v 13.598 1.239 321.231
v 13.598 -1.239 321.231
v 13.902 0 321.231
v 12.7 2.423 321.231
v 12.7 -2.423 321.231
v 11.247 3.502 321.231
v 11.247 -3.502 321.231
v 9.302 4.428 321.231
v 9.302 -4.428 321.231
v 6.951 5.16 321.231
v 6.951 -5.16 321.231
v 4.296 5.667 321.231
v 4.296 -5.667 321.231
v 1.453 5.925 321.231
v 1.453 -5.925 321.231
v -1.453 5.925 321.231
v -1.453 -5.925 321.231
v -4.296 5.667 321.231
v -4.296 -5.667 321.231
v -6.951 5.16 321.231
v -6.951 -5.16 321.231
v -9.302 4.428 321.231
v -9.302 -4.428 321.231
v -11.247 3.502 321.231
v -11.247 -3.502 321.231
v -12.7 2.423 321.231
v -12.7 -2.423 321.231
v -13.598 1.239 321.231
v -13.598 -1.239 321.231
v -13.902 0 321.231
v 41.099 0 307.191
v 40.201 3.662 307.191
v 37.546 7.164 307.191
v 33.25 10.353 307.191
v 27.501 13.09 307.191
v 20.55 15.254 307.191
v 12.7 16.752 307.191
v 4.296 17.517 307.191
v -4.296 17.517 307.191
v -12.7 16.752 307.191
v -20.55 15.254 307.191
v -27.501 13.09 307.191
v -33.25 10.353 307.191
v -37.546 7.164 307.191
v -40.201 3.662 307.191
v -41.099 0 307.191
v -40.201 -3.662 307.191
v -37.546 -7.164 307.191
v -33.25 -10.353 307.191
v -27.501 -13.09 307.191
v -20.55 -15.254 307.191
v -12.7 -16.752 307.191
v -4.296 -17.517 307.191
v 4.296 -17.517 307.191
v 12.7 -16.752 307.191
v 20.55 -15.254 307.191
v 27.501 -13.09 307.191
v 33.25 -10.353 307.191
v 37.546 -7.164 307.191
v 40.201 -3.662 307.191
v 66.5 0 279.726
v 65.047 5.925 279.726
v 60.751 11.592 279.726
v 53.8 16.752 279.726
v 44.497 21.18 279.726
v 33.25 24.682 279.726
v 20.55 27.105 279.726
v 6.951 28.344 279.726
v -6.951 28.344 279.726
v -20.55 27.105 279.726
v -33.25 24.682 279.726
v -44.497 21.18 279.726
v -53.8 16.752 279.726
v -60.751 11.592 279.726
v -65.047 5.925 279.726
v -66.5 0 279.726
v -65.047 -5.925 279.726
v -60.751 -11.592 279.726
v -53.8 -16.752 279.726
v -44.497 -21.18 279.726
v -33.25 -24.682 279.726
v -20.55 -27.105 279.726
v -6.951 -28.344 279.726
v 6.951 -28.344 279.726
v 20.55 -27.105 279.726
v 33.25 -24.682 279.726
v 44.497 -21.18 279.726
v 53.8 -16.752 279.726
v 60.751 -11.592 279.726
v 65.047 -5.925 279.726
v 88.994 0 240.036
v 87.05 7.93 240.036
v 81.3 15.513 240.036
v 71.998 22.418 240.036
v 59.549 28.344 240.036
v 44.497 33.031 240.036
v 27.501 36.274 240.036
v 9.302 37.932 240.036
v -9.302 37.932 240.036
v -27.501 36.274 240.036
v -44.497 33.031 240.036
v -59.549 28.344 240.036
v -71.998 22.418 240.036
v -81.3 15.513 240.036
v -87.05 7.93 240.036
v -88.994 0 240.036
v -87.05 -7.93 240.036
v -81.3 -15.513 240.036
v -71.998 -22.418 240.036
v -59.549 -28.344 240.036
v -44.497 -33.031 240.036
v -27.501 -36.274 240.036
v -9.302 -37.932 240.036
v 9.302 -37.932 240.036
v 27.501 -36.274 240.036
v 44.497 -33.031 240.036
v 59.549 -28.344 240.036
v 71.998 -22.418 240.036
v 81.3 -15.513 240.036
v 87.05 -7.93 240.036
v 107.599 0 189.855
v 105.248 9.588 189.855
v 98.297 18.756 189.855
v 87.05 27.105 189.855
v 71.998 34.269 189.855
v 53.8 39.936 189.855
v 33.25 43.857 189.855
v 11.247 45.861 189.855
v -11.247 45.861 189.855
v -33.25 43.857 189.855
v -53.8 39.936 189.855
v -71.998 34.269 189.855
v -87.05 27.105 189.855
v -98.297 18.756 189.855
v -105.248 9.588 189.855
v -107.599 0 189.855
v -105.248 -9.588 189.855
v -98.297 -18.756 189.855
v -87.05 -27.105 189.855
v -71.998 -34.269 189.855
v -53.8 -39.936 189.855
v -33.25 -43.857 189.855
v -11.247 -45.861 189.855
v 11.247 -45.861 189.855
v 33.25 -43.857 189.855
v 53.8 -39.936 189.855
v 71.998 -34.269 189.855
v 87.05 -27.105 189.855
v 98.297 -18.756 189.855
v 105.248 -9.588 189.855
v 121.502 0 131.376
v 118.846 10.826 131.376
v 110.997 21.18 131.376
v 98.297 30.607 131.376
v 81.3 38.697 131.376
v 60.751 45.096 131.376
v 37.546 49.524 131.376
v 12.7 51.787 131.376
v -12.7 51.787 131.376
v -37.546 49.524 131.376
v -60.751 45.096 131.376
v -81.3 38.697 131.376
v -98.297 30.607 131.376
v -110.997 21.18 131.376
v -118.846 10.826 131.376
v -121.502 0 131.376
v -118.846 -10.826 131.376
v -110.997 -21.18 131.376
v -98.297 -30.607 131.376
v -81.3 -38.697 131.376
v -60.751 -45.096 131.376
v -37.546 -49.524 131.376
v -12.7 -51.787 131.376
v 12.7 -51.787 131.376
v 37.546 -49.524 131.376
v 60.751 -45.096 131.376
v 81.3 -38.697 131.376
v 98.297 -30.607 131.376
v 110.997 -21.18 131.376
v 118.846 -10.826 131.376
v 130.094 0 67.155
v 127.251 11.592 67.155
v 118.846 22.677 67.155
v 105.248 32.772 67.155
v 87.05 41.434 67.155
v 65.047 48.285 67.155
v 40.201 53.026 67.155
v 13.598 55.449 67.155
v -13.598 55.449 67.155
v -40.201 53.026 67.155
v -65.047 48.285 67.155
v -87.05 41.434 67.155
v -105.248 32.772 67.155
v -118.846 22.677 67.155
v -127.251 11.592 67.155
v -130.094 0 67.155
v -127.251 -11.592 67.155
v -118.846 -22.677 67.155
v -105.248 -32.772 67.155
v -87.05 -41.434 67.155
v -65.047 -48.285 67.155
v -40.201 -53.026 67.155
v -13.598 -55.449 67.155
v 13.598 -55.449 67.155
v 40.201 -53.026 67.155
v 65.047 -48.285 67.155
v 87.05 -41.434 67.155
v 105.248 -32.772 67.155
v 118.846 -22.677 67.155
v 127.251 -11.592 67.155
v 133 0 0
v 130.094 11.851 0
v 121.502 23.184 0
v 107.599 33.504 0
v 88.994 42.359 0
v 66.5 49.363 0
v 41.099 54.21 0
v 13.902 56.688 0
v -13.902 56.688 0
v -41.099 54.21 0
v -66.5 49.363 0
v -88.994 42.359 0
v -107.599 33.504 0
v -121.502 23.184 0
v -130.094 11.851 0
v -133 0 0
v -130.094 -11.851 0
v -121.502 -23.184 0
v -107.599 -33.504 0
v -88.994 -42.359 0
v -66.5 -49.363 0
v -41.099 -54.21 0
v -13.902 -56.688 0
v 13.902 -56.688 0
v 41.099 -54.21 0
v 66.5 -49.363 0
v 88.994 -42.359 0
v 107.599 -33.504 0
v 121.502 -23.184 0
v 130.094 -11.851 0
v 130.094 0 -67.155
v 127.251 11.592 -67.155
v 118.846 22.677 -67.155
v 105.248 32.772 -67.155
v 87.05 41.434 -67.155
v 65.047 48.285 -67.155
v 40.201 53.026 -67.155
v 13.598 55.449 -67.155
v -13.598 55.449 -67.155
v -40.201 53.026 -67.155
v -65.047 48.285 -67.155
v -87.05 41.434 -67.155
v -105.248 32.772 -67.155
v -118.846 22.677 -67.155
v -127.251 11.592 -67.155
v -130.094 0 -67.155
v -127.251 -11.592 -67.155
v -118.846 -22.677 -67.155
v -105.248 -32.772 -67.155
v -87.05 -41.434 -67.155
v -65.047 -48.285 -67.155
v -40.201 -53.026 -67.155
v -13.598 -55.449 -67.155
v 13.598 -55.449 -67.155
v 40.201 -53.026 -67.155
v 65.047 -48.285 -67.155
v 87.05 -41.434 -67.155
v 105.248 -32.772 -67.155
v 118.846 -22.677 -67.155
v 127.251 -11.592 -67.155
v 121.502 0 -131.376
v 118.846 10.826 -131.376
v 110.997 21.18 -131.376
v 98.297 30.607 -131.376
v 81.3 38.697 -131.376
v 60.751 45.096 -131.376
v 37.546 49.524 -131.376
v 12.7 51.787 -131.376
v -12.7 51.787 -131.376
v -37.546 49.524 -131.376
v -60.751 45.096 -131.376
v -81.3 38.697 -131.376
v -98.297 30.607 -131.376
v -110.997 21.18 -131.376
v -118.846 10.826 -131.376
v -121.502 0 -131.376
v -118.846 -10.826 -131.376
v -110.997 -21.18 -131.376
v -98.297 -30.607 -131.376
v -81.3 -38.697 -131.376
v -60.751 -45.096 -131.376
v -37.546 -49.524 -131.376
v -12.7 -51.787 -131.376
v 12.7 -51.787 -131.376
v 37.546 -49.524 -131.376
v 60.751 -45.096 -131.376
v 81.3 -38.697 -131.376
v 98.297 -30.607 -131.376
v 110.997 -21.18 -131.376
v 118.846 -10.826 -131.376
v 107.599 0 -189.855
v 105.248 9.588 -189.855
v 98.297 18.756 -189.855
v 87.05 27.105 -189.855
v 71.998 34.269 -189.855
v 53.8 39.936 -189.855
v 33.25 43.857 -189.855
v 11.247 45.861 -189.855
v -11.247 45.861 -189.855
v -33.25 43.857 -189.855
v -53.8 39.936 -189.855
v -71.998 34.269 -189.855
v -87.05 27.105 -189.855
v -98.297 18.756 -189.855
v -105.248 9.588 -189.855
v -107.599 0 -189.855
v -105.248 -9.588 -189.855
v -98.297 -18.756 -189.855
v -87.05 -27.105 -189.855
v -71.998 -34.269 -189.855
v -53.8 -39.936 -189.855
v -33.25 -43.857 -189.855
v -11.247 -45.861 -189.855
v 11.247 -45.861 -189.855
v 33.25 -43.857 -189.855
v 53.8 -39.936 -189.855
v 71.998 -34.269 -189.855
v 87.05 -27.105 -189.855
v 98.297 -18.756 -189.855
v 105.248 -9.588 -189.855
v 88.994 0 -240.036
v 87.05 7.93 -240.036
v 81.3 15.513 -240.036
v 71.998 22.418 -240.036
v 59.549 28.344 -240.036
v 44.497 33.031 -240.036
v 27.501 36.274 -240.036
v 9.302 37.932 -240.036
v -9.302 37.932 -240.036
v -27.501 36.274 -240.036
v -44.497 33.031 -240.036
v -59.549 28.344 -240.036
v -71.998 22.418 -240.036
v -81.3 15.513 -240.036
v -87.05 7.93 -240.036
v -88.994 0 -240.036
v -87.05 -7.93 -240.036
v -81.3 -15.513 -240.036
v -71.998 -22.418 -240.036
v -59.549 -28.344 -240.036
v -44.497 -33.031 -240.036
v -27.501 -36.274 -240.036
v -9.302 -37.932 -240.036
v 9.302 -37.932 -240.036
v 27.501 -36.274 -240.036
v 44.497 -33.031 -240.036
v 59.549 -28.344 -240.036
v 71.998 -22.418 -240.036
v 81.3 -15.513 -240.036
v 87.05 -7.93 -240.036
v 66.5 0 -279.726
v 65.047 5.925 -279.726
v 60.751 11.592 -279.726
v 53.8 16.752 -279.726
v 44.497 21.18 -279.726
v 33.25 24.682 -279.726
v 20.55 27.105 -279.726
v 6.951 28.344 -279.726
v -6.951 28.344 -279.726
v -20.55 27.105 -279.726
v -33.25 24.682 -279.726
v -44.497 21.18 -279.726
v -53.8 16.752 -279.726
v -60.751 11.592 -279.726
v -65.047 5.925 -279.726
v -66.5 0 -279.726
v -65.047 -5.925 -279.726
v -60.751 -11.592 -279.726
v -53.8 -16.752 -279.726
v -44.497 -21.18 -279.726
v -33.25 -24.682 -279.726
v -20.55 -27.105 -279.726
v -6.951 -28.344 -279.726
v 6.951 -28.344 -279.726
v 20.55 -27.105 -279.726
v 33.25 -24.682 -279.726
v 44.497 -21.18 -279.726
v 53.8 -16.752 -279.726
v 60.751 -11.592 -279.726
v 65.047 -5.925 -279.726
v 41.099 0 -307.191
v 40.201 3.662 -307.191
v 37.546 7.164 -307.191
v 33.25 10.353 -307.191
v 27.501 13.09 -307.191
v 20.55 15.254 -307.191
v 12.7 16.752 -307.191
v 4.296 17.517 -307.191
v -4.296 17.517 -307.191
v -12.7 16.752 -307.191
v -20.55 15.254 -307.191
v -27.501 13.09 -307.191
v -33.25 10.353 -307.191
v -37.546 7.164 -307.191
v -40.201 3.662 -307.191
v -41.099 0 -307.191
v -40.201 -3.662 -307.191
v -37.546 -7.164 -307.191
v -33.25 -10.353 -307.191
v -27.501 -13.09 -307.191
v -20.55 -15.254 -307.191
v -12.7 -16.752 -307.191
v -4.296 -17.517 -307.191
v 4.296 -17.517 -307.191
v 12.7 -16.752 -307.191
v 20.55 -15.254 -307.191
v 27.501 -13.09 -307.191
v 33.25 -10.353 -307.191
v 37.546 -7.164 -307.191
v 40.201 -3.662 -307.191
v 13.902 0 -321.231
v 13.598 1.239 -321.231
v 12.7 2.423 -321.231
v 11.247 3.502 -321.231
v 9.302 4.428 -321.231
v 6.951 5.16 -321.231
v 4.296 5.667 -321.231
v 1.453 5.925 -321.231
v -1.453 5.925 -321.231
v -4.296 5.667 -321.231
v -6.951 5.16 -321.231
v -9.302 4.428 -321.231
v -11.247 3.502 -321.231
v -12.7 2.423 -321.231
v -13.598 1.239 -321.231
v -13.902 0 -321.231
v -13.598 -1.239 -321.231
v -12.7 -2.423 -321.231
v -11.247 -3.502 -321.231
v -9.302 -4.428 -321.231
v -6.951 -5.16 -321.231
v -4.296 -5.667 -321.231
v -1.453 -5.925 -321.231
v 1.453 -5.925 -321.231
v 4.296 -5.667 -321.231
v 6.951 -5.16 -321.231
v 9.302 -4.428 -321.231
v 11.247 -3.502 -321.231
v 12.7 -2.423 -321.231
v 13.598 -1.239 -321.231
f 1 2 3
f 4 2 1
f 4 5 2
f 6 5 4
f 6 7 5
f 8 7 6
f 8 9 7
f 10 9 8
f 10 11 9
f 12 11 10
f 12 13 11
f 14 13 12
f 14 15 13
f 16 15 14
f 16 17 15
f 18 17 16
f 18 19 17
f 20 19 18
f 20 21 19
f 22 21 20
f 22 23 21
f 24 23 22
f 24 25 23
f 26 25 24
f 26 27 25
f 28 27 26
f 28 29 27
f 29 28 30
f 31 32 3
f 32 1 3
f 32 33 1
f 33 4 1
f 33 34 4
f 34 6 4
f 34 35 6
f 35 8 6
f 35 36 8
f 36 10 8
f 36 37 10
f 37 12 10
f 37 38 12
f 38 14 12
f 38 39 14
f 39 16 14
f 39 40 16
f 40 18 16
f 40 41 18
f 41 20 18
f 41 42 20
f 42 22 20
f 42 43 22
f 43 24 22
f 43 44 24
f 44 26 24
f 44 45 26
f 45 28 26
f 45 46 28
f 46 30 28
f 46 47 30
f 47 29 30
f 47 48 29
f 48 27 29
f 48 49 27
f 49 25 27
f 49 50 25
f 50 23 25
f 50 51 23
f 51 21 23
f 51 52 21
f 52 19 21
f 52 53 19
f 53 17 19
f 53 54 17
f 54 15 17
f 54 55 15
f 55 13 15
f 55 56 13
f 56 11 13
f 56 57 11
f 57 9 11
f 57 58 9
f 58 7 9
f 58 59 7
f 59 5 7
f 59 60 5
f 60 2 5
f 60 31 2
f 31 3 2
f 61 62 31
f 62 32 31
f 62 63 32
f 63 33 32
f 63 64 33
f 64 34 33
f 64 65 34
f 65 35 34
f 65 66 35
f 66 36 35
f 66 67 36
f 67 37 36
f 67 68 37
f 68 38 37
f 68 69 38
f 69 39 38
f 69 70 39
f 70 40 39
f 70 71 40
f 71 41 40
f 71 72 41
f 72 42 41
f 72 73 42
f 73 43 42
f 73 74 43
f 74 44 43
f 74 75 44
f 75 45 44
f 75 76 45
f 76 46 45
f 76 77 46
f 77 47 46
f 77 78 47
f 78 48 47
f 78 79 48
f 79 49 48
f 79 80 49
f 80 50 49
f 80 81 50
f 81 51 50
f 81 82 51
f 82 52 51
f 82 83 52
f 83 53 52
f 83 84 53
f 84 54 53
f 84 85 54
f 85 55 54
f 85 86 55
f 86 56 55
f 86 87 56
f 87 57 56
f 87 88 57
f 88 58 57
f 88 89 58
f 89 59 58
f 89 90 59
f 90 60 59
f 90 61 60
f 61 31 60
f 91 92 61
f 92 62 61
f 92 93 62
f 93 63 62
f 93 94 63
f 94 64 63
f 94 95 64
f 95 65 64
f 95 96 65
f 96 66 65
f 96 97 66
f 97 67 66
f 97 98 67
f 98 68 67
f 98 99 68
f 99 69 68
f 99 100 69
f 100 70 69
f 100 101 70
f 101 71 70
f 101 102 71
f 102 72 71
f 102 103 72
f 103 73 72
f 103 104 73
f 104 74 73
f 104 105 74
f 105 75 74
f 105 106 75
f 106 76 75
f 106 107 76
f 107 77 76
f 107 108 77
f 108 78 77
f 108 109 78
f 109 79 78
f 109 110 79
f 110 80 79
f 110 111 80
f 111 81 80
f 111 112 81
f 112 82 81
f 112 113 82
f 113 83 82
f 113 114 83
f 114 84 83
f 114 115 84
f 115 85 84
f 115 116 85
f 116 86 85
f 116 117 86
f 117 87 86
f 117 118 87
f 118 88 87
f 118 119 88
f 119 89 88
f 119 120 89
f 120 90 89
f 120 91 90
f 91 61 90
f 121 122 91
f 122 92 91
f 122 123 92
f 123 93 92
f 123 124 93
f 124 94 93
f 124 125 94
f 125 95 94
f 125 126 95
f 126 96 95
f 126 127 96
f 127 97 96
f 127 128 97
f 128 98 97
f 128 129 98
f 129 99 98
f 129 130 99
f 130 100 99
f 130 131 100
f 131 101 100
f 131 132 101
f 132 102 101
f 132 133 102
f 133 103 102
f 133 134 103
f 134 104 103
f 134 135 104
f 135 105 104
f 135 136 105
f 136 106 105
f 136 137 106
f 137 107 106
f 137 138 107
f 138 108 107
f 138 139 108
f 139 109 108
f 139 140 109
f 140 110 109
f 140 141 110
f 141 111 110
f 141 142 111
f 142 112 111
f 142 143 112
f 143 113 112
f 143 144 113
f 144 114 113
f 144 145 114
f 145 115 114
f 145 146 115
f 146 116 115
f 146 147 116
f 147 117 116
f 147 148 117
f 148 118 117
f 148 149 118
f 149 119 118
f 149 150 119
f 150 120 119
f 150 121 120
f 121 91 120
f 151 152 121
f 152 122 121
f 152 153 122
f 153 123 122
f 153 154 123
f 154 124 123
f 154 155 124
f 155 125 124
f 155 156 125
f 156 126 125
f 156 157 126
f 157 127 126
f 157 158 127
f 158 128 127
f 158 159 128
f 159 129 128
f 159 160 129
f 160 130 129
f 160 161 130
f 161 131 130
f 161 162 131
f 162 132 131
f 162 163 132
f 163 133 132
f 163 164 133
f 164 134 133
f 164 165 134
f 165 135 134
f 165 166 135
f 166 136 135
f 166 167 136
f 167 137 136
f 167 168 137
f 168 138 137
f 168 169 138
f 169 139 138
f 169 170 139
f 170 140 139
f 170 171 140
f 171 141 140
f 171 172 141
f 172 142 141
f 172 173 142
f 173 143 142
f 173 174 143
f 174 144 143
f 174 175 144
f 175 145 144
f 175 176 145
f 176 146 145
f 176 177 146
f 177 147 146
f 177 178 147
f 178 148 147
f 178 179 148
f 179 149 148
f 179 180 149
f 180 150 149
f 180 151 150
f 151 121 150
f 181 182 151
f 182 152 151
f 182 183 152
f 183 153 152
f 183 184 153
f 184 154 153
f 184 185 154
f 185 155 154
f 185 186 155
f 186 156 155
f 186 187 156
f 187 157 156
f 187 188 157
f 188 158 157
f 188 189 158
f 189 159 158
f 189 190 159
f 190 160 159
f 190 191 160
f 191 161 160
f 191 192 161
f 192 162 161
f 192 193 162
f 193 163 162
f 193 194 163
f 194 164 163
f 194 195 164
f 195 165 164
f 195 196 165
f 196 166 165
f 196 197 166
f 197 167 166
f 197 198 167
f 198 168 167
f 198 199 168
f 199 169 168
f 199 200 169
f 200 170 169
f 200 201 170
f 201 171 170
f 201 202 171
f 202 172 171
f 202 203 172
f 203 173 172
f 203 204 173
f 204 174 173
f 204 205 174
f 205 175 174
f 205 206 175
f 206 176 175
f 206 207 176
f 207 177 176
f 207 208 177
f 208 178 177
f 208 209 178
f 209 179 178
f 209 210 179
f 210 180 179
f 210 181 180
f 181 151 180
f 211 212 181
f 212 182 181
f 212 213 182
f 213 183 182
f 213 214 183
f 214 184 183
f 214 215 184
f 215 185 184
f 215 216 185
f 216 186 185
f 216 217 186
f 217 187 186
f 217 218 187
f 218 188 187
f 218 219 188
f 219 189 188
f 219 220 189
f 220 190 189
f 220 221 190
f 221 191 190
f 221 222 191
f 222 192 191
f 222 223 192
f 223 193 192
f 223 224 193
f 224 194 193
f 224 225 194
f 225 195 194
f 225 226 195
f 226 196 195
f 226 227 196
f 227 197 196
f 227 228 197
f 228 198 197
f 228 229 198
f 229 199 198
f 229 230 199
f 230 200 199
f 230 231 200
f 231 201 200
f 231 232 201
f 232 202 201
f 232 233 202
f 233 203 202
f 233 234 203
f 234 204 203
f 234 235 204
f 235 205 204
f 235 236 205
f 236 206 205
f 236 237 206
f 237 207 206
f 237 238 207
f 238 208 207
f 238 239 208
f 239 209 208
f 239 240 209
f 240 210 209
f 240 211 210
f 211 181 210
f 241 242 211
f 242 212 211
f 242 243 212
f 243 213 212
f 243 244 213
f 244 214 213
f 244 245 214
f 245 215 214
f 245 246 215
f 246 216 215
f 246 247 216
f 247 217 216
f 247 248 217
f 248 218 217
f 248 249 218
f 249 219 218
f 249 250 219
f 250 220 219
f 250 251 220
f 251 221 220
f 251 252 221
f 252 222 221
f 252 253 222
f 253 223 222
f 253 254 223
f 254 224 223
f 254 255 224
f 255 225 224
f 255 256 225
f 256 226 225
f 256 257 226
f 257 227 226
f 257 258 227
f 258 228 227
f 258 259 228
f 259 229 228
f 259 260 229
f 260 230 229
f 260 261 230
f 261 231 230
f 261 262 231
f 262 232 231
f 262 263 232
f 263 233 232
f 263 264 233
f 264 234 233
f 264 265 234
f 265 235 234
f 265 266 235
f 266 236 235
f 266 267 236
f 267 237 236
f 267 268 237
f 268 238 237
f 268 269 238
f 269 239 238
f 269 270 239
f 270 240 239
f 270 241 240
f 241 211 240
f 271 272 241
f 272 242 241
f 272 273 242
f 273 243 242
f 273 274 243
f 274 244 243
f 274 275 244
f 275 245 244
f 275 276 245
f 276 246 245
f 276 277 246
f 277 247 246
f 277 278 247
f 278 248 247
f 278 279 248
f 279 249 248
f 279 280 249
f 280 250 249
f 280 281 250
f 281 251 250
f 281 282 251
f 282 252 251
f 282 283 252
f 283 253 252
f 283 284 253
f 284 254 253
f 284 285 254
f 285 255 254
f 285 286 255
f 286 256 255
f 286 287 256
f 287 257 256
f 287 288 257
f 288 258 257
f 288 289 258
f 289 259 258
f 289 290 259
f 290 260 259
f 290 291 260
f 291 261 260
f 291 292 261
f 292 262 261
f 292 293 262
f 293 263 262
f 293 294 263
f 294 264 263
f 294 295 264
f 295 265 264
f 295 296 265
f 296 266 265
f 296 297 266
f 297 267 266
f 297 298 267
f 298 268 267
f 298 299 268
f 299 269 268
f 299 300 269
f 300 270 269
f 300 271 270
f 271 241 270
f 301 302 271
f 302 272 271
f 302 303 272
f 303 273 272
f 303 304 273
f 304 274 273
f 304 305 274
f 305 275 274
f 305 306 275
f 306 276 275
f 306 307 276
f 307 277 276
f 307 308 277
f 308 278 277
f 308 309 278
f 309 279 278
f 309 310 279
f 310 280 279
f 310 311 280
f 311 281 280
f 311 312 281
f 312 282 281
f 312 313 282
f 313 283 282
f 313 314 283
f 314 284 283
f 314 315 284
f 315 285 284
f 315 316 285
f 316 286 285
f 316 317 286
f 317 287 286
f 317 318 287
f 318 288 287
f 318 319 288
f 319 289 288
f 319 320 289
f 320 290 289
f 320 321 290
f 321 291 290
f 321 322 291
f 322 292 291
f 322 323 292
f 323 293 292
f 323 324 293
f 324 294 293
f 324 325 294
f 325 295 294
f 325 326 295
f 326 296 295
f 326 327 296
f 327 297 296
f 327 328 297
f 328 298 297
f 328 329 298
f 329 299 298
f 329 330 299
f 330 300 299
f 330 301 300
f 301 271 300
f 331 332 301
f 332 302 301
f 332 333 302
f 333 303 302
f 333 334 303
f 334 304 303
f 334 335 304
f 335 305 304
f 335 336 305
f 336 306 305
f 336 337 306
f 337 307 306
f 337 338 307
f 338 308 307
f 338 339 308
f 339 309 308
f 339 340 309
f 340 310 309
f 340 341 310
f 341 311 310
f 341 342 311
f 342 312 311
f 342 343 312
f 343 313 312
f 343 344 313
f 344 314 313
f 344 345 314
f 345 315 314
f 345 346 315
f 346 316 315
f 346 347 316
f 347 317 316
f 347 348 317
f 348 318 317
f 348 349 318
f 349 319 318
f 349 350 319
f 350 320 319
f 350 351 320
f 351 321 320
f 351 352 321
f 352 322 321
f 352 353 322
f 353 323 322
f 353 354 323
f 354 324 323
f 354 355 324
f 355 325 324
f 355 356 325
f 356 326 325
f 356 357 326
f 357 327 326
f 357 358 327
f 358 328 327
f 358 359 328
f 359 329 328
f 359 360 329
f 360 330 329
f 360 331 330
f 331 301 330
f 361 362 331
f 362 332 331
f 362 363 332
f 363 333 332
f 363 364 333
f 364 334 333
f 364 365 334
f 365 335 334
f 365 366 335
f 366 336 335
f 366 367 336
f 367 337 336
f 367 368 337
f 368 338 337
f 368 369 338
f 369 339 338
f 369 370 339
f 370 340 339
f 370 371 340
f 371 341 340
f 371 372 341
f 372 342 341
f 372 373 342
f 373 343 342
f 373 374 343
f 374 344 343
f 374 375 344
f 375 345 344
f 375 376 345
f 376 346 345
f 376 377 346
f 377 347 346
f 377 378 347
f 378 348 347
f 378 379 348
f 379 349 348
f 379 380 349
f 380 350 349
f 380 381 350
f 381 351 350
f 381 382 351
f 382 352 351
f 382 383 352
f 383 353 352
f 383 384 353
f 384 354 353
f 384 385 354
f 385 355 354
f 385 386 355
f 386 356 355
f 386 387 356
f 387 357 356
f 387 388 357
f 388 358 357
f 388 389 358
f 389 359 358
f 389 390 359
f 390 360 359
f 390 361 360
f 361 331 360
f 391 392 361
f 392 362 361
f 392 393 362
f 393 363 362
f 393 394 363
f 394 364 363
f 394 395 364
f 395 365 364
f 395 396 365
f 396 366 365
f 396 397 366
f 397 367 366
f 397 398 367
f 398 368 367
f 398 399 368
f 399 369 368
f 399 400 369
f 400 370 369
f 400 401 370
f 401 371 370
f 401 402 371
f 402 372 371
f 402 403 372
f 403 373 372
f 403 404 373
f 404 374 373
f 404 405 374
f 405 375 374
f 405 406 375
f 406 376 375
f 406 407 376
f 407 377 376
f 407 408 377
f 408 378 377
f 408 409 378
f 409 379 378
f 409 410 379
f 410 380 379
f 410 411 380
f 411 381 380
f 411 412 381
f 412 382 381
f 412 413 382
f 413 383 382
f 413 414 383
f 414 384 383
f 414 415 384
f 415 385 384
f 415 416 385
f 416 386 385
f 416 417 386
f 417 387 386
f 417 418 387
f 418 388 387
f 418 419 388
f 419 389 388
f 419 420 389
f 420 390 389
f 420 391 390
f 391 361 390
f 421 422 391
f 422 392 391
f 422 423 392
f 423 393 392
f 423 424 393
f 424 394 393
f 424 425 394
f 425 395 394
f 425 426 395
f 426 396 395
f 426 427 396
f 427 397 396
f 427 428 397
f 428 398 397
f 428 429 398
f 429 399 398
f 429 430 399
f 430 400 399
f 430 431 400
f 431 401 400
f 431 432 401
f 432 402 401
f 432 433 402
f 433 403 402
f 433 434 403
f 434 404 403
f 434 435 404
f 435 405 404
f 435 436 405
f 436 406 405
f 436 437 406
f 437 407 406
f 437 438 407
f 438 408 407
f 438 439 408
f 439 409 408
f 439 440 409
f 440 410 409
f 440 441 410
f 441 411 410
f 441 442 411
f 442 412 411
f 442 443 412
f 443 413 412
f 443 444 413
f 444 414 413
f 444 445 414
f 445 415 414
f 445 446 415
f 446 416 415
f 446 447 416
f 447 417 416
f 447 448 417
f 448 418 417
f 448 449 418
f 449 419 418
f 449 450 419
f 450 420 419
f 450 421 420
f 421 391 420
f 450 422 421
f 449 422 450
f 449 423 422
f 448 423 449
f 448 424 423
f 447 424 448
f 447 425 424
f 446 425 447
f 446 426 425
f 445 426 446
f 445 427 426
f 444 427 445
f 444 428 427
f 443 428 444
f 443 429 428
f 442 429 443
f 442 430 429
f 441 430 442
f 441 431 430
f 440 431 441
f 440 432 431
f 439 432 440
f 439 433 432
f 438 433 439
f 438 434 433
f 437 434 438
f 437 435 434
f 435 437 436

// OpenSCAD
// Generated by SolidPython 1.0.1 on 2020-07-29 00:46:47


scale(v = [7, 3, 17]) {
	sphere(r = 19);
}
/***********************************************
*********      SolidPython code:      **********
************************************************
 
# import packages: SolidPython
from solid import *
from solid.utils import *
from itertools import chain, combinations, permutations


class Resize:

    def __init__(self, scad_file):
        self.scad_file = scad_file
        #self.scad_file = import_scad(scad_file)
        # cone/cylinder param:
        self.r1 = 0
        self.r2 = 0
        self.h = 0
        # rectangular prism param:
        self.w = 0
        self.l = 0
        # ellipse param:
        self.r = 0

    # import OpenScad code (file name corresponds to shape)


    # classify shape + parameters
    def assign(self, param1, param2, param3):
        if self.scad_file == 'cone.scad':
            self.r1 = param1
            self.r2 = param2
            self.h = param3
        elif self.scad_file == 'cylinder.scad':
            self.r1 = param1
            self.r2 = param2
            self.h = param3
        elif self.scad_file == 'rectangularPrism.scad':
            self.h = param1
            self.l = param2
            self.w = param3
        else:
            self.r = param1
            self.h = param2

    # resize parameters
    def iterate(self):
        x = range(3, 20, 2)
        i = 1
        if self.scad_file == 'cone.scad':
            tempList = list(permutations(x, 2))
            for temp in tempList:
                param1 = temp[0]
                param2 = temp[1]
                filepath = 'produced_scad_files/' + 'cone' + str(param1) + '_' + str(param2) + '_' + '.scad'
                scad_render_to_file(cylinder(h=param1, r1=param2, r2=0), filepath)

        elif self.scad_file == 'cylinder.scad':
            tempList = list(permutations(x, 3))
            for temp in tempList:
                param1 = temp[0]
                param2 = temp[1]
                filepath = 'produced_scad_files/' + 'cylinder' + str(param1) + '_' + str(param2) + '_' + '.scad'
                scad_render_to_file(cylinder(h=param1, r1=param2, r2=param2), filepath)

        elif self.scad_file == 'rectangularPrism.scad':
            tempList = list(permutations(x, 3))
            for temp in tempList:
                param1 = temp[0]
                param2 = temp[1]
                param3 = temp[2]
                filepath = 'produced_scad_files/' + 'rectangularPrism' + str(param1) + '_' + str(param2) + '_' + str(
                    param3) + '.scad'
                scad_render_to_file(cube(size=(param1, param2, param3)), filepath)

        elif self.scad_file == 'ellipse.scad':
            tempList = list(permutations(x, 4))
            for temp in tempList:
                param1 = temp[0]
                param2 = temp[1]
                param3 = temp[2]
                param4 = temp[3]
                filepath = 'produced_scad_files/' + 'ellipse' + str(param1) + '_' + str(param2) + '_' + str(param3) + '_' + str(param4) + '.scad'
                scad_render_to_file(scale([param1, param2, param3])(sphere(r=param4)), filepath)

    def render_to_scadfile(self):
        scad_render_to_file(scad, 'example.scad') 
 
************************************************/
